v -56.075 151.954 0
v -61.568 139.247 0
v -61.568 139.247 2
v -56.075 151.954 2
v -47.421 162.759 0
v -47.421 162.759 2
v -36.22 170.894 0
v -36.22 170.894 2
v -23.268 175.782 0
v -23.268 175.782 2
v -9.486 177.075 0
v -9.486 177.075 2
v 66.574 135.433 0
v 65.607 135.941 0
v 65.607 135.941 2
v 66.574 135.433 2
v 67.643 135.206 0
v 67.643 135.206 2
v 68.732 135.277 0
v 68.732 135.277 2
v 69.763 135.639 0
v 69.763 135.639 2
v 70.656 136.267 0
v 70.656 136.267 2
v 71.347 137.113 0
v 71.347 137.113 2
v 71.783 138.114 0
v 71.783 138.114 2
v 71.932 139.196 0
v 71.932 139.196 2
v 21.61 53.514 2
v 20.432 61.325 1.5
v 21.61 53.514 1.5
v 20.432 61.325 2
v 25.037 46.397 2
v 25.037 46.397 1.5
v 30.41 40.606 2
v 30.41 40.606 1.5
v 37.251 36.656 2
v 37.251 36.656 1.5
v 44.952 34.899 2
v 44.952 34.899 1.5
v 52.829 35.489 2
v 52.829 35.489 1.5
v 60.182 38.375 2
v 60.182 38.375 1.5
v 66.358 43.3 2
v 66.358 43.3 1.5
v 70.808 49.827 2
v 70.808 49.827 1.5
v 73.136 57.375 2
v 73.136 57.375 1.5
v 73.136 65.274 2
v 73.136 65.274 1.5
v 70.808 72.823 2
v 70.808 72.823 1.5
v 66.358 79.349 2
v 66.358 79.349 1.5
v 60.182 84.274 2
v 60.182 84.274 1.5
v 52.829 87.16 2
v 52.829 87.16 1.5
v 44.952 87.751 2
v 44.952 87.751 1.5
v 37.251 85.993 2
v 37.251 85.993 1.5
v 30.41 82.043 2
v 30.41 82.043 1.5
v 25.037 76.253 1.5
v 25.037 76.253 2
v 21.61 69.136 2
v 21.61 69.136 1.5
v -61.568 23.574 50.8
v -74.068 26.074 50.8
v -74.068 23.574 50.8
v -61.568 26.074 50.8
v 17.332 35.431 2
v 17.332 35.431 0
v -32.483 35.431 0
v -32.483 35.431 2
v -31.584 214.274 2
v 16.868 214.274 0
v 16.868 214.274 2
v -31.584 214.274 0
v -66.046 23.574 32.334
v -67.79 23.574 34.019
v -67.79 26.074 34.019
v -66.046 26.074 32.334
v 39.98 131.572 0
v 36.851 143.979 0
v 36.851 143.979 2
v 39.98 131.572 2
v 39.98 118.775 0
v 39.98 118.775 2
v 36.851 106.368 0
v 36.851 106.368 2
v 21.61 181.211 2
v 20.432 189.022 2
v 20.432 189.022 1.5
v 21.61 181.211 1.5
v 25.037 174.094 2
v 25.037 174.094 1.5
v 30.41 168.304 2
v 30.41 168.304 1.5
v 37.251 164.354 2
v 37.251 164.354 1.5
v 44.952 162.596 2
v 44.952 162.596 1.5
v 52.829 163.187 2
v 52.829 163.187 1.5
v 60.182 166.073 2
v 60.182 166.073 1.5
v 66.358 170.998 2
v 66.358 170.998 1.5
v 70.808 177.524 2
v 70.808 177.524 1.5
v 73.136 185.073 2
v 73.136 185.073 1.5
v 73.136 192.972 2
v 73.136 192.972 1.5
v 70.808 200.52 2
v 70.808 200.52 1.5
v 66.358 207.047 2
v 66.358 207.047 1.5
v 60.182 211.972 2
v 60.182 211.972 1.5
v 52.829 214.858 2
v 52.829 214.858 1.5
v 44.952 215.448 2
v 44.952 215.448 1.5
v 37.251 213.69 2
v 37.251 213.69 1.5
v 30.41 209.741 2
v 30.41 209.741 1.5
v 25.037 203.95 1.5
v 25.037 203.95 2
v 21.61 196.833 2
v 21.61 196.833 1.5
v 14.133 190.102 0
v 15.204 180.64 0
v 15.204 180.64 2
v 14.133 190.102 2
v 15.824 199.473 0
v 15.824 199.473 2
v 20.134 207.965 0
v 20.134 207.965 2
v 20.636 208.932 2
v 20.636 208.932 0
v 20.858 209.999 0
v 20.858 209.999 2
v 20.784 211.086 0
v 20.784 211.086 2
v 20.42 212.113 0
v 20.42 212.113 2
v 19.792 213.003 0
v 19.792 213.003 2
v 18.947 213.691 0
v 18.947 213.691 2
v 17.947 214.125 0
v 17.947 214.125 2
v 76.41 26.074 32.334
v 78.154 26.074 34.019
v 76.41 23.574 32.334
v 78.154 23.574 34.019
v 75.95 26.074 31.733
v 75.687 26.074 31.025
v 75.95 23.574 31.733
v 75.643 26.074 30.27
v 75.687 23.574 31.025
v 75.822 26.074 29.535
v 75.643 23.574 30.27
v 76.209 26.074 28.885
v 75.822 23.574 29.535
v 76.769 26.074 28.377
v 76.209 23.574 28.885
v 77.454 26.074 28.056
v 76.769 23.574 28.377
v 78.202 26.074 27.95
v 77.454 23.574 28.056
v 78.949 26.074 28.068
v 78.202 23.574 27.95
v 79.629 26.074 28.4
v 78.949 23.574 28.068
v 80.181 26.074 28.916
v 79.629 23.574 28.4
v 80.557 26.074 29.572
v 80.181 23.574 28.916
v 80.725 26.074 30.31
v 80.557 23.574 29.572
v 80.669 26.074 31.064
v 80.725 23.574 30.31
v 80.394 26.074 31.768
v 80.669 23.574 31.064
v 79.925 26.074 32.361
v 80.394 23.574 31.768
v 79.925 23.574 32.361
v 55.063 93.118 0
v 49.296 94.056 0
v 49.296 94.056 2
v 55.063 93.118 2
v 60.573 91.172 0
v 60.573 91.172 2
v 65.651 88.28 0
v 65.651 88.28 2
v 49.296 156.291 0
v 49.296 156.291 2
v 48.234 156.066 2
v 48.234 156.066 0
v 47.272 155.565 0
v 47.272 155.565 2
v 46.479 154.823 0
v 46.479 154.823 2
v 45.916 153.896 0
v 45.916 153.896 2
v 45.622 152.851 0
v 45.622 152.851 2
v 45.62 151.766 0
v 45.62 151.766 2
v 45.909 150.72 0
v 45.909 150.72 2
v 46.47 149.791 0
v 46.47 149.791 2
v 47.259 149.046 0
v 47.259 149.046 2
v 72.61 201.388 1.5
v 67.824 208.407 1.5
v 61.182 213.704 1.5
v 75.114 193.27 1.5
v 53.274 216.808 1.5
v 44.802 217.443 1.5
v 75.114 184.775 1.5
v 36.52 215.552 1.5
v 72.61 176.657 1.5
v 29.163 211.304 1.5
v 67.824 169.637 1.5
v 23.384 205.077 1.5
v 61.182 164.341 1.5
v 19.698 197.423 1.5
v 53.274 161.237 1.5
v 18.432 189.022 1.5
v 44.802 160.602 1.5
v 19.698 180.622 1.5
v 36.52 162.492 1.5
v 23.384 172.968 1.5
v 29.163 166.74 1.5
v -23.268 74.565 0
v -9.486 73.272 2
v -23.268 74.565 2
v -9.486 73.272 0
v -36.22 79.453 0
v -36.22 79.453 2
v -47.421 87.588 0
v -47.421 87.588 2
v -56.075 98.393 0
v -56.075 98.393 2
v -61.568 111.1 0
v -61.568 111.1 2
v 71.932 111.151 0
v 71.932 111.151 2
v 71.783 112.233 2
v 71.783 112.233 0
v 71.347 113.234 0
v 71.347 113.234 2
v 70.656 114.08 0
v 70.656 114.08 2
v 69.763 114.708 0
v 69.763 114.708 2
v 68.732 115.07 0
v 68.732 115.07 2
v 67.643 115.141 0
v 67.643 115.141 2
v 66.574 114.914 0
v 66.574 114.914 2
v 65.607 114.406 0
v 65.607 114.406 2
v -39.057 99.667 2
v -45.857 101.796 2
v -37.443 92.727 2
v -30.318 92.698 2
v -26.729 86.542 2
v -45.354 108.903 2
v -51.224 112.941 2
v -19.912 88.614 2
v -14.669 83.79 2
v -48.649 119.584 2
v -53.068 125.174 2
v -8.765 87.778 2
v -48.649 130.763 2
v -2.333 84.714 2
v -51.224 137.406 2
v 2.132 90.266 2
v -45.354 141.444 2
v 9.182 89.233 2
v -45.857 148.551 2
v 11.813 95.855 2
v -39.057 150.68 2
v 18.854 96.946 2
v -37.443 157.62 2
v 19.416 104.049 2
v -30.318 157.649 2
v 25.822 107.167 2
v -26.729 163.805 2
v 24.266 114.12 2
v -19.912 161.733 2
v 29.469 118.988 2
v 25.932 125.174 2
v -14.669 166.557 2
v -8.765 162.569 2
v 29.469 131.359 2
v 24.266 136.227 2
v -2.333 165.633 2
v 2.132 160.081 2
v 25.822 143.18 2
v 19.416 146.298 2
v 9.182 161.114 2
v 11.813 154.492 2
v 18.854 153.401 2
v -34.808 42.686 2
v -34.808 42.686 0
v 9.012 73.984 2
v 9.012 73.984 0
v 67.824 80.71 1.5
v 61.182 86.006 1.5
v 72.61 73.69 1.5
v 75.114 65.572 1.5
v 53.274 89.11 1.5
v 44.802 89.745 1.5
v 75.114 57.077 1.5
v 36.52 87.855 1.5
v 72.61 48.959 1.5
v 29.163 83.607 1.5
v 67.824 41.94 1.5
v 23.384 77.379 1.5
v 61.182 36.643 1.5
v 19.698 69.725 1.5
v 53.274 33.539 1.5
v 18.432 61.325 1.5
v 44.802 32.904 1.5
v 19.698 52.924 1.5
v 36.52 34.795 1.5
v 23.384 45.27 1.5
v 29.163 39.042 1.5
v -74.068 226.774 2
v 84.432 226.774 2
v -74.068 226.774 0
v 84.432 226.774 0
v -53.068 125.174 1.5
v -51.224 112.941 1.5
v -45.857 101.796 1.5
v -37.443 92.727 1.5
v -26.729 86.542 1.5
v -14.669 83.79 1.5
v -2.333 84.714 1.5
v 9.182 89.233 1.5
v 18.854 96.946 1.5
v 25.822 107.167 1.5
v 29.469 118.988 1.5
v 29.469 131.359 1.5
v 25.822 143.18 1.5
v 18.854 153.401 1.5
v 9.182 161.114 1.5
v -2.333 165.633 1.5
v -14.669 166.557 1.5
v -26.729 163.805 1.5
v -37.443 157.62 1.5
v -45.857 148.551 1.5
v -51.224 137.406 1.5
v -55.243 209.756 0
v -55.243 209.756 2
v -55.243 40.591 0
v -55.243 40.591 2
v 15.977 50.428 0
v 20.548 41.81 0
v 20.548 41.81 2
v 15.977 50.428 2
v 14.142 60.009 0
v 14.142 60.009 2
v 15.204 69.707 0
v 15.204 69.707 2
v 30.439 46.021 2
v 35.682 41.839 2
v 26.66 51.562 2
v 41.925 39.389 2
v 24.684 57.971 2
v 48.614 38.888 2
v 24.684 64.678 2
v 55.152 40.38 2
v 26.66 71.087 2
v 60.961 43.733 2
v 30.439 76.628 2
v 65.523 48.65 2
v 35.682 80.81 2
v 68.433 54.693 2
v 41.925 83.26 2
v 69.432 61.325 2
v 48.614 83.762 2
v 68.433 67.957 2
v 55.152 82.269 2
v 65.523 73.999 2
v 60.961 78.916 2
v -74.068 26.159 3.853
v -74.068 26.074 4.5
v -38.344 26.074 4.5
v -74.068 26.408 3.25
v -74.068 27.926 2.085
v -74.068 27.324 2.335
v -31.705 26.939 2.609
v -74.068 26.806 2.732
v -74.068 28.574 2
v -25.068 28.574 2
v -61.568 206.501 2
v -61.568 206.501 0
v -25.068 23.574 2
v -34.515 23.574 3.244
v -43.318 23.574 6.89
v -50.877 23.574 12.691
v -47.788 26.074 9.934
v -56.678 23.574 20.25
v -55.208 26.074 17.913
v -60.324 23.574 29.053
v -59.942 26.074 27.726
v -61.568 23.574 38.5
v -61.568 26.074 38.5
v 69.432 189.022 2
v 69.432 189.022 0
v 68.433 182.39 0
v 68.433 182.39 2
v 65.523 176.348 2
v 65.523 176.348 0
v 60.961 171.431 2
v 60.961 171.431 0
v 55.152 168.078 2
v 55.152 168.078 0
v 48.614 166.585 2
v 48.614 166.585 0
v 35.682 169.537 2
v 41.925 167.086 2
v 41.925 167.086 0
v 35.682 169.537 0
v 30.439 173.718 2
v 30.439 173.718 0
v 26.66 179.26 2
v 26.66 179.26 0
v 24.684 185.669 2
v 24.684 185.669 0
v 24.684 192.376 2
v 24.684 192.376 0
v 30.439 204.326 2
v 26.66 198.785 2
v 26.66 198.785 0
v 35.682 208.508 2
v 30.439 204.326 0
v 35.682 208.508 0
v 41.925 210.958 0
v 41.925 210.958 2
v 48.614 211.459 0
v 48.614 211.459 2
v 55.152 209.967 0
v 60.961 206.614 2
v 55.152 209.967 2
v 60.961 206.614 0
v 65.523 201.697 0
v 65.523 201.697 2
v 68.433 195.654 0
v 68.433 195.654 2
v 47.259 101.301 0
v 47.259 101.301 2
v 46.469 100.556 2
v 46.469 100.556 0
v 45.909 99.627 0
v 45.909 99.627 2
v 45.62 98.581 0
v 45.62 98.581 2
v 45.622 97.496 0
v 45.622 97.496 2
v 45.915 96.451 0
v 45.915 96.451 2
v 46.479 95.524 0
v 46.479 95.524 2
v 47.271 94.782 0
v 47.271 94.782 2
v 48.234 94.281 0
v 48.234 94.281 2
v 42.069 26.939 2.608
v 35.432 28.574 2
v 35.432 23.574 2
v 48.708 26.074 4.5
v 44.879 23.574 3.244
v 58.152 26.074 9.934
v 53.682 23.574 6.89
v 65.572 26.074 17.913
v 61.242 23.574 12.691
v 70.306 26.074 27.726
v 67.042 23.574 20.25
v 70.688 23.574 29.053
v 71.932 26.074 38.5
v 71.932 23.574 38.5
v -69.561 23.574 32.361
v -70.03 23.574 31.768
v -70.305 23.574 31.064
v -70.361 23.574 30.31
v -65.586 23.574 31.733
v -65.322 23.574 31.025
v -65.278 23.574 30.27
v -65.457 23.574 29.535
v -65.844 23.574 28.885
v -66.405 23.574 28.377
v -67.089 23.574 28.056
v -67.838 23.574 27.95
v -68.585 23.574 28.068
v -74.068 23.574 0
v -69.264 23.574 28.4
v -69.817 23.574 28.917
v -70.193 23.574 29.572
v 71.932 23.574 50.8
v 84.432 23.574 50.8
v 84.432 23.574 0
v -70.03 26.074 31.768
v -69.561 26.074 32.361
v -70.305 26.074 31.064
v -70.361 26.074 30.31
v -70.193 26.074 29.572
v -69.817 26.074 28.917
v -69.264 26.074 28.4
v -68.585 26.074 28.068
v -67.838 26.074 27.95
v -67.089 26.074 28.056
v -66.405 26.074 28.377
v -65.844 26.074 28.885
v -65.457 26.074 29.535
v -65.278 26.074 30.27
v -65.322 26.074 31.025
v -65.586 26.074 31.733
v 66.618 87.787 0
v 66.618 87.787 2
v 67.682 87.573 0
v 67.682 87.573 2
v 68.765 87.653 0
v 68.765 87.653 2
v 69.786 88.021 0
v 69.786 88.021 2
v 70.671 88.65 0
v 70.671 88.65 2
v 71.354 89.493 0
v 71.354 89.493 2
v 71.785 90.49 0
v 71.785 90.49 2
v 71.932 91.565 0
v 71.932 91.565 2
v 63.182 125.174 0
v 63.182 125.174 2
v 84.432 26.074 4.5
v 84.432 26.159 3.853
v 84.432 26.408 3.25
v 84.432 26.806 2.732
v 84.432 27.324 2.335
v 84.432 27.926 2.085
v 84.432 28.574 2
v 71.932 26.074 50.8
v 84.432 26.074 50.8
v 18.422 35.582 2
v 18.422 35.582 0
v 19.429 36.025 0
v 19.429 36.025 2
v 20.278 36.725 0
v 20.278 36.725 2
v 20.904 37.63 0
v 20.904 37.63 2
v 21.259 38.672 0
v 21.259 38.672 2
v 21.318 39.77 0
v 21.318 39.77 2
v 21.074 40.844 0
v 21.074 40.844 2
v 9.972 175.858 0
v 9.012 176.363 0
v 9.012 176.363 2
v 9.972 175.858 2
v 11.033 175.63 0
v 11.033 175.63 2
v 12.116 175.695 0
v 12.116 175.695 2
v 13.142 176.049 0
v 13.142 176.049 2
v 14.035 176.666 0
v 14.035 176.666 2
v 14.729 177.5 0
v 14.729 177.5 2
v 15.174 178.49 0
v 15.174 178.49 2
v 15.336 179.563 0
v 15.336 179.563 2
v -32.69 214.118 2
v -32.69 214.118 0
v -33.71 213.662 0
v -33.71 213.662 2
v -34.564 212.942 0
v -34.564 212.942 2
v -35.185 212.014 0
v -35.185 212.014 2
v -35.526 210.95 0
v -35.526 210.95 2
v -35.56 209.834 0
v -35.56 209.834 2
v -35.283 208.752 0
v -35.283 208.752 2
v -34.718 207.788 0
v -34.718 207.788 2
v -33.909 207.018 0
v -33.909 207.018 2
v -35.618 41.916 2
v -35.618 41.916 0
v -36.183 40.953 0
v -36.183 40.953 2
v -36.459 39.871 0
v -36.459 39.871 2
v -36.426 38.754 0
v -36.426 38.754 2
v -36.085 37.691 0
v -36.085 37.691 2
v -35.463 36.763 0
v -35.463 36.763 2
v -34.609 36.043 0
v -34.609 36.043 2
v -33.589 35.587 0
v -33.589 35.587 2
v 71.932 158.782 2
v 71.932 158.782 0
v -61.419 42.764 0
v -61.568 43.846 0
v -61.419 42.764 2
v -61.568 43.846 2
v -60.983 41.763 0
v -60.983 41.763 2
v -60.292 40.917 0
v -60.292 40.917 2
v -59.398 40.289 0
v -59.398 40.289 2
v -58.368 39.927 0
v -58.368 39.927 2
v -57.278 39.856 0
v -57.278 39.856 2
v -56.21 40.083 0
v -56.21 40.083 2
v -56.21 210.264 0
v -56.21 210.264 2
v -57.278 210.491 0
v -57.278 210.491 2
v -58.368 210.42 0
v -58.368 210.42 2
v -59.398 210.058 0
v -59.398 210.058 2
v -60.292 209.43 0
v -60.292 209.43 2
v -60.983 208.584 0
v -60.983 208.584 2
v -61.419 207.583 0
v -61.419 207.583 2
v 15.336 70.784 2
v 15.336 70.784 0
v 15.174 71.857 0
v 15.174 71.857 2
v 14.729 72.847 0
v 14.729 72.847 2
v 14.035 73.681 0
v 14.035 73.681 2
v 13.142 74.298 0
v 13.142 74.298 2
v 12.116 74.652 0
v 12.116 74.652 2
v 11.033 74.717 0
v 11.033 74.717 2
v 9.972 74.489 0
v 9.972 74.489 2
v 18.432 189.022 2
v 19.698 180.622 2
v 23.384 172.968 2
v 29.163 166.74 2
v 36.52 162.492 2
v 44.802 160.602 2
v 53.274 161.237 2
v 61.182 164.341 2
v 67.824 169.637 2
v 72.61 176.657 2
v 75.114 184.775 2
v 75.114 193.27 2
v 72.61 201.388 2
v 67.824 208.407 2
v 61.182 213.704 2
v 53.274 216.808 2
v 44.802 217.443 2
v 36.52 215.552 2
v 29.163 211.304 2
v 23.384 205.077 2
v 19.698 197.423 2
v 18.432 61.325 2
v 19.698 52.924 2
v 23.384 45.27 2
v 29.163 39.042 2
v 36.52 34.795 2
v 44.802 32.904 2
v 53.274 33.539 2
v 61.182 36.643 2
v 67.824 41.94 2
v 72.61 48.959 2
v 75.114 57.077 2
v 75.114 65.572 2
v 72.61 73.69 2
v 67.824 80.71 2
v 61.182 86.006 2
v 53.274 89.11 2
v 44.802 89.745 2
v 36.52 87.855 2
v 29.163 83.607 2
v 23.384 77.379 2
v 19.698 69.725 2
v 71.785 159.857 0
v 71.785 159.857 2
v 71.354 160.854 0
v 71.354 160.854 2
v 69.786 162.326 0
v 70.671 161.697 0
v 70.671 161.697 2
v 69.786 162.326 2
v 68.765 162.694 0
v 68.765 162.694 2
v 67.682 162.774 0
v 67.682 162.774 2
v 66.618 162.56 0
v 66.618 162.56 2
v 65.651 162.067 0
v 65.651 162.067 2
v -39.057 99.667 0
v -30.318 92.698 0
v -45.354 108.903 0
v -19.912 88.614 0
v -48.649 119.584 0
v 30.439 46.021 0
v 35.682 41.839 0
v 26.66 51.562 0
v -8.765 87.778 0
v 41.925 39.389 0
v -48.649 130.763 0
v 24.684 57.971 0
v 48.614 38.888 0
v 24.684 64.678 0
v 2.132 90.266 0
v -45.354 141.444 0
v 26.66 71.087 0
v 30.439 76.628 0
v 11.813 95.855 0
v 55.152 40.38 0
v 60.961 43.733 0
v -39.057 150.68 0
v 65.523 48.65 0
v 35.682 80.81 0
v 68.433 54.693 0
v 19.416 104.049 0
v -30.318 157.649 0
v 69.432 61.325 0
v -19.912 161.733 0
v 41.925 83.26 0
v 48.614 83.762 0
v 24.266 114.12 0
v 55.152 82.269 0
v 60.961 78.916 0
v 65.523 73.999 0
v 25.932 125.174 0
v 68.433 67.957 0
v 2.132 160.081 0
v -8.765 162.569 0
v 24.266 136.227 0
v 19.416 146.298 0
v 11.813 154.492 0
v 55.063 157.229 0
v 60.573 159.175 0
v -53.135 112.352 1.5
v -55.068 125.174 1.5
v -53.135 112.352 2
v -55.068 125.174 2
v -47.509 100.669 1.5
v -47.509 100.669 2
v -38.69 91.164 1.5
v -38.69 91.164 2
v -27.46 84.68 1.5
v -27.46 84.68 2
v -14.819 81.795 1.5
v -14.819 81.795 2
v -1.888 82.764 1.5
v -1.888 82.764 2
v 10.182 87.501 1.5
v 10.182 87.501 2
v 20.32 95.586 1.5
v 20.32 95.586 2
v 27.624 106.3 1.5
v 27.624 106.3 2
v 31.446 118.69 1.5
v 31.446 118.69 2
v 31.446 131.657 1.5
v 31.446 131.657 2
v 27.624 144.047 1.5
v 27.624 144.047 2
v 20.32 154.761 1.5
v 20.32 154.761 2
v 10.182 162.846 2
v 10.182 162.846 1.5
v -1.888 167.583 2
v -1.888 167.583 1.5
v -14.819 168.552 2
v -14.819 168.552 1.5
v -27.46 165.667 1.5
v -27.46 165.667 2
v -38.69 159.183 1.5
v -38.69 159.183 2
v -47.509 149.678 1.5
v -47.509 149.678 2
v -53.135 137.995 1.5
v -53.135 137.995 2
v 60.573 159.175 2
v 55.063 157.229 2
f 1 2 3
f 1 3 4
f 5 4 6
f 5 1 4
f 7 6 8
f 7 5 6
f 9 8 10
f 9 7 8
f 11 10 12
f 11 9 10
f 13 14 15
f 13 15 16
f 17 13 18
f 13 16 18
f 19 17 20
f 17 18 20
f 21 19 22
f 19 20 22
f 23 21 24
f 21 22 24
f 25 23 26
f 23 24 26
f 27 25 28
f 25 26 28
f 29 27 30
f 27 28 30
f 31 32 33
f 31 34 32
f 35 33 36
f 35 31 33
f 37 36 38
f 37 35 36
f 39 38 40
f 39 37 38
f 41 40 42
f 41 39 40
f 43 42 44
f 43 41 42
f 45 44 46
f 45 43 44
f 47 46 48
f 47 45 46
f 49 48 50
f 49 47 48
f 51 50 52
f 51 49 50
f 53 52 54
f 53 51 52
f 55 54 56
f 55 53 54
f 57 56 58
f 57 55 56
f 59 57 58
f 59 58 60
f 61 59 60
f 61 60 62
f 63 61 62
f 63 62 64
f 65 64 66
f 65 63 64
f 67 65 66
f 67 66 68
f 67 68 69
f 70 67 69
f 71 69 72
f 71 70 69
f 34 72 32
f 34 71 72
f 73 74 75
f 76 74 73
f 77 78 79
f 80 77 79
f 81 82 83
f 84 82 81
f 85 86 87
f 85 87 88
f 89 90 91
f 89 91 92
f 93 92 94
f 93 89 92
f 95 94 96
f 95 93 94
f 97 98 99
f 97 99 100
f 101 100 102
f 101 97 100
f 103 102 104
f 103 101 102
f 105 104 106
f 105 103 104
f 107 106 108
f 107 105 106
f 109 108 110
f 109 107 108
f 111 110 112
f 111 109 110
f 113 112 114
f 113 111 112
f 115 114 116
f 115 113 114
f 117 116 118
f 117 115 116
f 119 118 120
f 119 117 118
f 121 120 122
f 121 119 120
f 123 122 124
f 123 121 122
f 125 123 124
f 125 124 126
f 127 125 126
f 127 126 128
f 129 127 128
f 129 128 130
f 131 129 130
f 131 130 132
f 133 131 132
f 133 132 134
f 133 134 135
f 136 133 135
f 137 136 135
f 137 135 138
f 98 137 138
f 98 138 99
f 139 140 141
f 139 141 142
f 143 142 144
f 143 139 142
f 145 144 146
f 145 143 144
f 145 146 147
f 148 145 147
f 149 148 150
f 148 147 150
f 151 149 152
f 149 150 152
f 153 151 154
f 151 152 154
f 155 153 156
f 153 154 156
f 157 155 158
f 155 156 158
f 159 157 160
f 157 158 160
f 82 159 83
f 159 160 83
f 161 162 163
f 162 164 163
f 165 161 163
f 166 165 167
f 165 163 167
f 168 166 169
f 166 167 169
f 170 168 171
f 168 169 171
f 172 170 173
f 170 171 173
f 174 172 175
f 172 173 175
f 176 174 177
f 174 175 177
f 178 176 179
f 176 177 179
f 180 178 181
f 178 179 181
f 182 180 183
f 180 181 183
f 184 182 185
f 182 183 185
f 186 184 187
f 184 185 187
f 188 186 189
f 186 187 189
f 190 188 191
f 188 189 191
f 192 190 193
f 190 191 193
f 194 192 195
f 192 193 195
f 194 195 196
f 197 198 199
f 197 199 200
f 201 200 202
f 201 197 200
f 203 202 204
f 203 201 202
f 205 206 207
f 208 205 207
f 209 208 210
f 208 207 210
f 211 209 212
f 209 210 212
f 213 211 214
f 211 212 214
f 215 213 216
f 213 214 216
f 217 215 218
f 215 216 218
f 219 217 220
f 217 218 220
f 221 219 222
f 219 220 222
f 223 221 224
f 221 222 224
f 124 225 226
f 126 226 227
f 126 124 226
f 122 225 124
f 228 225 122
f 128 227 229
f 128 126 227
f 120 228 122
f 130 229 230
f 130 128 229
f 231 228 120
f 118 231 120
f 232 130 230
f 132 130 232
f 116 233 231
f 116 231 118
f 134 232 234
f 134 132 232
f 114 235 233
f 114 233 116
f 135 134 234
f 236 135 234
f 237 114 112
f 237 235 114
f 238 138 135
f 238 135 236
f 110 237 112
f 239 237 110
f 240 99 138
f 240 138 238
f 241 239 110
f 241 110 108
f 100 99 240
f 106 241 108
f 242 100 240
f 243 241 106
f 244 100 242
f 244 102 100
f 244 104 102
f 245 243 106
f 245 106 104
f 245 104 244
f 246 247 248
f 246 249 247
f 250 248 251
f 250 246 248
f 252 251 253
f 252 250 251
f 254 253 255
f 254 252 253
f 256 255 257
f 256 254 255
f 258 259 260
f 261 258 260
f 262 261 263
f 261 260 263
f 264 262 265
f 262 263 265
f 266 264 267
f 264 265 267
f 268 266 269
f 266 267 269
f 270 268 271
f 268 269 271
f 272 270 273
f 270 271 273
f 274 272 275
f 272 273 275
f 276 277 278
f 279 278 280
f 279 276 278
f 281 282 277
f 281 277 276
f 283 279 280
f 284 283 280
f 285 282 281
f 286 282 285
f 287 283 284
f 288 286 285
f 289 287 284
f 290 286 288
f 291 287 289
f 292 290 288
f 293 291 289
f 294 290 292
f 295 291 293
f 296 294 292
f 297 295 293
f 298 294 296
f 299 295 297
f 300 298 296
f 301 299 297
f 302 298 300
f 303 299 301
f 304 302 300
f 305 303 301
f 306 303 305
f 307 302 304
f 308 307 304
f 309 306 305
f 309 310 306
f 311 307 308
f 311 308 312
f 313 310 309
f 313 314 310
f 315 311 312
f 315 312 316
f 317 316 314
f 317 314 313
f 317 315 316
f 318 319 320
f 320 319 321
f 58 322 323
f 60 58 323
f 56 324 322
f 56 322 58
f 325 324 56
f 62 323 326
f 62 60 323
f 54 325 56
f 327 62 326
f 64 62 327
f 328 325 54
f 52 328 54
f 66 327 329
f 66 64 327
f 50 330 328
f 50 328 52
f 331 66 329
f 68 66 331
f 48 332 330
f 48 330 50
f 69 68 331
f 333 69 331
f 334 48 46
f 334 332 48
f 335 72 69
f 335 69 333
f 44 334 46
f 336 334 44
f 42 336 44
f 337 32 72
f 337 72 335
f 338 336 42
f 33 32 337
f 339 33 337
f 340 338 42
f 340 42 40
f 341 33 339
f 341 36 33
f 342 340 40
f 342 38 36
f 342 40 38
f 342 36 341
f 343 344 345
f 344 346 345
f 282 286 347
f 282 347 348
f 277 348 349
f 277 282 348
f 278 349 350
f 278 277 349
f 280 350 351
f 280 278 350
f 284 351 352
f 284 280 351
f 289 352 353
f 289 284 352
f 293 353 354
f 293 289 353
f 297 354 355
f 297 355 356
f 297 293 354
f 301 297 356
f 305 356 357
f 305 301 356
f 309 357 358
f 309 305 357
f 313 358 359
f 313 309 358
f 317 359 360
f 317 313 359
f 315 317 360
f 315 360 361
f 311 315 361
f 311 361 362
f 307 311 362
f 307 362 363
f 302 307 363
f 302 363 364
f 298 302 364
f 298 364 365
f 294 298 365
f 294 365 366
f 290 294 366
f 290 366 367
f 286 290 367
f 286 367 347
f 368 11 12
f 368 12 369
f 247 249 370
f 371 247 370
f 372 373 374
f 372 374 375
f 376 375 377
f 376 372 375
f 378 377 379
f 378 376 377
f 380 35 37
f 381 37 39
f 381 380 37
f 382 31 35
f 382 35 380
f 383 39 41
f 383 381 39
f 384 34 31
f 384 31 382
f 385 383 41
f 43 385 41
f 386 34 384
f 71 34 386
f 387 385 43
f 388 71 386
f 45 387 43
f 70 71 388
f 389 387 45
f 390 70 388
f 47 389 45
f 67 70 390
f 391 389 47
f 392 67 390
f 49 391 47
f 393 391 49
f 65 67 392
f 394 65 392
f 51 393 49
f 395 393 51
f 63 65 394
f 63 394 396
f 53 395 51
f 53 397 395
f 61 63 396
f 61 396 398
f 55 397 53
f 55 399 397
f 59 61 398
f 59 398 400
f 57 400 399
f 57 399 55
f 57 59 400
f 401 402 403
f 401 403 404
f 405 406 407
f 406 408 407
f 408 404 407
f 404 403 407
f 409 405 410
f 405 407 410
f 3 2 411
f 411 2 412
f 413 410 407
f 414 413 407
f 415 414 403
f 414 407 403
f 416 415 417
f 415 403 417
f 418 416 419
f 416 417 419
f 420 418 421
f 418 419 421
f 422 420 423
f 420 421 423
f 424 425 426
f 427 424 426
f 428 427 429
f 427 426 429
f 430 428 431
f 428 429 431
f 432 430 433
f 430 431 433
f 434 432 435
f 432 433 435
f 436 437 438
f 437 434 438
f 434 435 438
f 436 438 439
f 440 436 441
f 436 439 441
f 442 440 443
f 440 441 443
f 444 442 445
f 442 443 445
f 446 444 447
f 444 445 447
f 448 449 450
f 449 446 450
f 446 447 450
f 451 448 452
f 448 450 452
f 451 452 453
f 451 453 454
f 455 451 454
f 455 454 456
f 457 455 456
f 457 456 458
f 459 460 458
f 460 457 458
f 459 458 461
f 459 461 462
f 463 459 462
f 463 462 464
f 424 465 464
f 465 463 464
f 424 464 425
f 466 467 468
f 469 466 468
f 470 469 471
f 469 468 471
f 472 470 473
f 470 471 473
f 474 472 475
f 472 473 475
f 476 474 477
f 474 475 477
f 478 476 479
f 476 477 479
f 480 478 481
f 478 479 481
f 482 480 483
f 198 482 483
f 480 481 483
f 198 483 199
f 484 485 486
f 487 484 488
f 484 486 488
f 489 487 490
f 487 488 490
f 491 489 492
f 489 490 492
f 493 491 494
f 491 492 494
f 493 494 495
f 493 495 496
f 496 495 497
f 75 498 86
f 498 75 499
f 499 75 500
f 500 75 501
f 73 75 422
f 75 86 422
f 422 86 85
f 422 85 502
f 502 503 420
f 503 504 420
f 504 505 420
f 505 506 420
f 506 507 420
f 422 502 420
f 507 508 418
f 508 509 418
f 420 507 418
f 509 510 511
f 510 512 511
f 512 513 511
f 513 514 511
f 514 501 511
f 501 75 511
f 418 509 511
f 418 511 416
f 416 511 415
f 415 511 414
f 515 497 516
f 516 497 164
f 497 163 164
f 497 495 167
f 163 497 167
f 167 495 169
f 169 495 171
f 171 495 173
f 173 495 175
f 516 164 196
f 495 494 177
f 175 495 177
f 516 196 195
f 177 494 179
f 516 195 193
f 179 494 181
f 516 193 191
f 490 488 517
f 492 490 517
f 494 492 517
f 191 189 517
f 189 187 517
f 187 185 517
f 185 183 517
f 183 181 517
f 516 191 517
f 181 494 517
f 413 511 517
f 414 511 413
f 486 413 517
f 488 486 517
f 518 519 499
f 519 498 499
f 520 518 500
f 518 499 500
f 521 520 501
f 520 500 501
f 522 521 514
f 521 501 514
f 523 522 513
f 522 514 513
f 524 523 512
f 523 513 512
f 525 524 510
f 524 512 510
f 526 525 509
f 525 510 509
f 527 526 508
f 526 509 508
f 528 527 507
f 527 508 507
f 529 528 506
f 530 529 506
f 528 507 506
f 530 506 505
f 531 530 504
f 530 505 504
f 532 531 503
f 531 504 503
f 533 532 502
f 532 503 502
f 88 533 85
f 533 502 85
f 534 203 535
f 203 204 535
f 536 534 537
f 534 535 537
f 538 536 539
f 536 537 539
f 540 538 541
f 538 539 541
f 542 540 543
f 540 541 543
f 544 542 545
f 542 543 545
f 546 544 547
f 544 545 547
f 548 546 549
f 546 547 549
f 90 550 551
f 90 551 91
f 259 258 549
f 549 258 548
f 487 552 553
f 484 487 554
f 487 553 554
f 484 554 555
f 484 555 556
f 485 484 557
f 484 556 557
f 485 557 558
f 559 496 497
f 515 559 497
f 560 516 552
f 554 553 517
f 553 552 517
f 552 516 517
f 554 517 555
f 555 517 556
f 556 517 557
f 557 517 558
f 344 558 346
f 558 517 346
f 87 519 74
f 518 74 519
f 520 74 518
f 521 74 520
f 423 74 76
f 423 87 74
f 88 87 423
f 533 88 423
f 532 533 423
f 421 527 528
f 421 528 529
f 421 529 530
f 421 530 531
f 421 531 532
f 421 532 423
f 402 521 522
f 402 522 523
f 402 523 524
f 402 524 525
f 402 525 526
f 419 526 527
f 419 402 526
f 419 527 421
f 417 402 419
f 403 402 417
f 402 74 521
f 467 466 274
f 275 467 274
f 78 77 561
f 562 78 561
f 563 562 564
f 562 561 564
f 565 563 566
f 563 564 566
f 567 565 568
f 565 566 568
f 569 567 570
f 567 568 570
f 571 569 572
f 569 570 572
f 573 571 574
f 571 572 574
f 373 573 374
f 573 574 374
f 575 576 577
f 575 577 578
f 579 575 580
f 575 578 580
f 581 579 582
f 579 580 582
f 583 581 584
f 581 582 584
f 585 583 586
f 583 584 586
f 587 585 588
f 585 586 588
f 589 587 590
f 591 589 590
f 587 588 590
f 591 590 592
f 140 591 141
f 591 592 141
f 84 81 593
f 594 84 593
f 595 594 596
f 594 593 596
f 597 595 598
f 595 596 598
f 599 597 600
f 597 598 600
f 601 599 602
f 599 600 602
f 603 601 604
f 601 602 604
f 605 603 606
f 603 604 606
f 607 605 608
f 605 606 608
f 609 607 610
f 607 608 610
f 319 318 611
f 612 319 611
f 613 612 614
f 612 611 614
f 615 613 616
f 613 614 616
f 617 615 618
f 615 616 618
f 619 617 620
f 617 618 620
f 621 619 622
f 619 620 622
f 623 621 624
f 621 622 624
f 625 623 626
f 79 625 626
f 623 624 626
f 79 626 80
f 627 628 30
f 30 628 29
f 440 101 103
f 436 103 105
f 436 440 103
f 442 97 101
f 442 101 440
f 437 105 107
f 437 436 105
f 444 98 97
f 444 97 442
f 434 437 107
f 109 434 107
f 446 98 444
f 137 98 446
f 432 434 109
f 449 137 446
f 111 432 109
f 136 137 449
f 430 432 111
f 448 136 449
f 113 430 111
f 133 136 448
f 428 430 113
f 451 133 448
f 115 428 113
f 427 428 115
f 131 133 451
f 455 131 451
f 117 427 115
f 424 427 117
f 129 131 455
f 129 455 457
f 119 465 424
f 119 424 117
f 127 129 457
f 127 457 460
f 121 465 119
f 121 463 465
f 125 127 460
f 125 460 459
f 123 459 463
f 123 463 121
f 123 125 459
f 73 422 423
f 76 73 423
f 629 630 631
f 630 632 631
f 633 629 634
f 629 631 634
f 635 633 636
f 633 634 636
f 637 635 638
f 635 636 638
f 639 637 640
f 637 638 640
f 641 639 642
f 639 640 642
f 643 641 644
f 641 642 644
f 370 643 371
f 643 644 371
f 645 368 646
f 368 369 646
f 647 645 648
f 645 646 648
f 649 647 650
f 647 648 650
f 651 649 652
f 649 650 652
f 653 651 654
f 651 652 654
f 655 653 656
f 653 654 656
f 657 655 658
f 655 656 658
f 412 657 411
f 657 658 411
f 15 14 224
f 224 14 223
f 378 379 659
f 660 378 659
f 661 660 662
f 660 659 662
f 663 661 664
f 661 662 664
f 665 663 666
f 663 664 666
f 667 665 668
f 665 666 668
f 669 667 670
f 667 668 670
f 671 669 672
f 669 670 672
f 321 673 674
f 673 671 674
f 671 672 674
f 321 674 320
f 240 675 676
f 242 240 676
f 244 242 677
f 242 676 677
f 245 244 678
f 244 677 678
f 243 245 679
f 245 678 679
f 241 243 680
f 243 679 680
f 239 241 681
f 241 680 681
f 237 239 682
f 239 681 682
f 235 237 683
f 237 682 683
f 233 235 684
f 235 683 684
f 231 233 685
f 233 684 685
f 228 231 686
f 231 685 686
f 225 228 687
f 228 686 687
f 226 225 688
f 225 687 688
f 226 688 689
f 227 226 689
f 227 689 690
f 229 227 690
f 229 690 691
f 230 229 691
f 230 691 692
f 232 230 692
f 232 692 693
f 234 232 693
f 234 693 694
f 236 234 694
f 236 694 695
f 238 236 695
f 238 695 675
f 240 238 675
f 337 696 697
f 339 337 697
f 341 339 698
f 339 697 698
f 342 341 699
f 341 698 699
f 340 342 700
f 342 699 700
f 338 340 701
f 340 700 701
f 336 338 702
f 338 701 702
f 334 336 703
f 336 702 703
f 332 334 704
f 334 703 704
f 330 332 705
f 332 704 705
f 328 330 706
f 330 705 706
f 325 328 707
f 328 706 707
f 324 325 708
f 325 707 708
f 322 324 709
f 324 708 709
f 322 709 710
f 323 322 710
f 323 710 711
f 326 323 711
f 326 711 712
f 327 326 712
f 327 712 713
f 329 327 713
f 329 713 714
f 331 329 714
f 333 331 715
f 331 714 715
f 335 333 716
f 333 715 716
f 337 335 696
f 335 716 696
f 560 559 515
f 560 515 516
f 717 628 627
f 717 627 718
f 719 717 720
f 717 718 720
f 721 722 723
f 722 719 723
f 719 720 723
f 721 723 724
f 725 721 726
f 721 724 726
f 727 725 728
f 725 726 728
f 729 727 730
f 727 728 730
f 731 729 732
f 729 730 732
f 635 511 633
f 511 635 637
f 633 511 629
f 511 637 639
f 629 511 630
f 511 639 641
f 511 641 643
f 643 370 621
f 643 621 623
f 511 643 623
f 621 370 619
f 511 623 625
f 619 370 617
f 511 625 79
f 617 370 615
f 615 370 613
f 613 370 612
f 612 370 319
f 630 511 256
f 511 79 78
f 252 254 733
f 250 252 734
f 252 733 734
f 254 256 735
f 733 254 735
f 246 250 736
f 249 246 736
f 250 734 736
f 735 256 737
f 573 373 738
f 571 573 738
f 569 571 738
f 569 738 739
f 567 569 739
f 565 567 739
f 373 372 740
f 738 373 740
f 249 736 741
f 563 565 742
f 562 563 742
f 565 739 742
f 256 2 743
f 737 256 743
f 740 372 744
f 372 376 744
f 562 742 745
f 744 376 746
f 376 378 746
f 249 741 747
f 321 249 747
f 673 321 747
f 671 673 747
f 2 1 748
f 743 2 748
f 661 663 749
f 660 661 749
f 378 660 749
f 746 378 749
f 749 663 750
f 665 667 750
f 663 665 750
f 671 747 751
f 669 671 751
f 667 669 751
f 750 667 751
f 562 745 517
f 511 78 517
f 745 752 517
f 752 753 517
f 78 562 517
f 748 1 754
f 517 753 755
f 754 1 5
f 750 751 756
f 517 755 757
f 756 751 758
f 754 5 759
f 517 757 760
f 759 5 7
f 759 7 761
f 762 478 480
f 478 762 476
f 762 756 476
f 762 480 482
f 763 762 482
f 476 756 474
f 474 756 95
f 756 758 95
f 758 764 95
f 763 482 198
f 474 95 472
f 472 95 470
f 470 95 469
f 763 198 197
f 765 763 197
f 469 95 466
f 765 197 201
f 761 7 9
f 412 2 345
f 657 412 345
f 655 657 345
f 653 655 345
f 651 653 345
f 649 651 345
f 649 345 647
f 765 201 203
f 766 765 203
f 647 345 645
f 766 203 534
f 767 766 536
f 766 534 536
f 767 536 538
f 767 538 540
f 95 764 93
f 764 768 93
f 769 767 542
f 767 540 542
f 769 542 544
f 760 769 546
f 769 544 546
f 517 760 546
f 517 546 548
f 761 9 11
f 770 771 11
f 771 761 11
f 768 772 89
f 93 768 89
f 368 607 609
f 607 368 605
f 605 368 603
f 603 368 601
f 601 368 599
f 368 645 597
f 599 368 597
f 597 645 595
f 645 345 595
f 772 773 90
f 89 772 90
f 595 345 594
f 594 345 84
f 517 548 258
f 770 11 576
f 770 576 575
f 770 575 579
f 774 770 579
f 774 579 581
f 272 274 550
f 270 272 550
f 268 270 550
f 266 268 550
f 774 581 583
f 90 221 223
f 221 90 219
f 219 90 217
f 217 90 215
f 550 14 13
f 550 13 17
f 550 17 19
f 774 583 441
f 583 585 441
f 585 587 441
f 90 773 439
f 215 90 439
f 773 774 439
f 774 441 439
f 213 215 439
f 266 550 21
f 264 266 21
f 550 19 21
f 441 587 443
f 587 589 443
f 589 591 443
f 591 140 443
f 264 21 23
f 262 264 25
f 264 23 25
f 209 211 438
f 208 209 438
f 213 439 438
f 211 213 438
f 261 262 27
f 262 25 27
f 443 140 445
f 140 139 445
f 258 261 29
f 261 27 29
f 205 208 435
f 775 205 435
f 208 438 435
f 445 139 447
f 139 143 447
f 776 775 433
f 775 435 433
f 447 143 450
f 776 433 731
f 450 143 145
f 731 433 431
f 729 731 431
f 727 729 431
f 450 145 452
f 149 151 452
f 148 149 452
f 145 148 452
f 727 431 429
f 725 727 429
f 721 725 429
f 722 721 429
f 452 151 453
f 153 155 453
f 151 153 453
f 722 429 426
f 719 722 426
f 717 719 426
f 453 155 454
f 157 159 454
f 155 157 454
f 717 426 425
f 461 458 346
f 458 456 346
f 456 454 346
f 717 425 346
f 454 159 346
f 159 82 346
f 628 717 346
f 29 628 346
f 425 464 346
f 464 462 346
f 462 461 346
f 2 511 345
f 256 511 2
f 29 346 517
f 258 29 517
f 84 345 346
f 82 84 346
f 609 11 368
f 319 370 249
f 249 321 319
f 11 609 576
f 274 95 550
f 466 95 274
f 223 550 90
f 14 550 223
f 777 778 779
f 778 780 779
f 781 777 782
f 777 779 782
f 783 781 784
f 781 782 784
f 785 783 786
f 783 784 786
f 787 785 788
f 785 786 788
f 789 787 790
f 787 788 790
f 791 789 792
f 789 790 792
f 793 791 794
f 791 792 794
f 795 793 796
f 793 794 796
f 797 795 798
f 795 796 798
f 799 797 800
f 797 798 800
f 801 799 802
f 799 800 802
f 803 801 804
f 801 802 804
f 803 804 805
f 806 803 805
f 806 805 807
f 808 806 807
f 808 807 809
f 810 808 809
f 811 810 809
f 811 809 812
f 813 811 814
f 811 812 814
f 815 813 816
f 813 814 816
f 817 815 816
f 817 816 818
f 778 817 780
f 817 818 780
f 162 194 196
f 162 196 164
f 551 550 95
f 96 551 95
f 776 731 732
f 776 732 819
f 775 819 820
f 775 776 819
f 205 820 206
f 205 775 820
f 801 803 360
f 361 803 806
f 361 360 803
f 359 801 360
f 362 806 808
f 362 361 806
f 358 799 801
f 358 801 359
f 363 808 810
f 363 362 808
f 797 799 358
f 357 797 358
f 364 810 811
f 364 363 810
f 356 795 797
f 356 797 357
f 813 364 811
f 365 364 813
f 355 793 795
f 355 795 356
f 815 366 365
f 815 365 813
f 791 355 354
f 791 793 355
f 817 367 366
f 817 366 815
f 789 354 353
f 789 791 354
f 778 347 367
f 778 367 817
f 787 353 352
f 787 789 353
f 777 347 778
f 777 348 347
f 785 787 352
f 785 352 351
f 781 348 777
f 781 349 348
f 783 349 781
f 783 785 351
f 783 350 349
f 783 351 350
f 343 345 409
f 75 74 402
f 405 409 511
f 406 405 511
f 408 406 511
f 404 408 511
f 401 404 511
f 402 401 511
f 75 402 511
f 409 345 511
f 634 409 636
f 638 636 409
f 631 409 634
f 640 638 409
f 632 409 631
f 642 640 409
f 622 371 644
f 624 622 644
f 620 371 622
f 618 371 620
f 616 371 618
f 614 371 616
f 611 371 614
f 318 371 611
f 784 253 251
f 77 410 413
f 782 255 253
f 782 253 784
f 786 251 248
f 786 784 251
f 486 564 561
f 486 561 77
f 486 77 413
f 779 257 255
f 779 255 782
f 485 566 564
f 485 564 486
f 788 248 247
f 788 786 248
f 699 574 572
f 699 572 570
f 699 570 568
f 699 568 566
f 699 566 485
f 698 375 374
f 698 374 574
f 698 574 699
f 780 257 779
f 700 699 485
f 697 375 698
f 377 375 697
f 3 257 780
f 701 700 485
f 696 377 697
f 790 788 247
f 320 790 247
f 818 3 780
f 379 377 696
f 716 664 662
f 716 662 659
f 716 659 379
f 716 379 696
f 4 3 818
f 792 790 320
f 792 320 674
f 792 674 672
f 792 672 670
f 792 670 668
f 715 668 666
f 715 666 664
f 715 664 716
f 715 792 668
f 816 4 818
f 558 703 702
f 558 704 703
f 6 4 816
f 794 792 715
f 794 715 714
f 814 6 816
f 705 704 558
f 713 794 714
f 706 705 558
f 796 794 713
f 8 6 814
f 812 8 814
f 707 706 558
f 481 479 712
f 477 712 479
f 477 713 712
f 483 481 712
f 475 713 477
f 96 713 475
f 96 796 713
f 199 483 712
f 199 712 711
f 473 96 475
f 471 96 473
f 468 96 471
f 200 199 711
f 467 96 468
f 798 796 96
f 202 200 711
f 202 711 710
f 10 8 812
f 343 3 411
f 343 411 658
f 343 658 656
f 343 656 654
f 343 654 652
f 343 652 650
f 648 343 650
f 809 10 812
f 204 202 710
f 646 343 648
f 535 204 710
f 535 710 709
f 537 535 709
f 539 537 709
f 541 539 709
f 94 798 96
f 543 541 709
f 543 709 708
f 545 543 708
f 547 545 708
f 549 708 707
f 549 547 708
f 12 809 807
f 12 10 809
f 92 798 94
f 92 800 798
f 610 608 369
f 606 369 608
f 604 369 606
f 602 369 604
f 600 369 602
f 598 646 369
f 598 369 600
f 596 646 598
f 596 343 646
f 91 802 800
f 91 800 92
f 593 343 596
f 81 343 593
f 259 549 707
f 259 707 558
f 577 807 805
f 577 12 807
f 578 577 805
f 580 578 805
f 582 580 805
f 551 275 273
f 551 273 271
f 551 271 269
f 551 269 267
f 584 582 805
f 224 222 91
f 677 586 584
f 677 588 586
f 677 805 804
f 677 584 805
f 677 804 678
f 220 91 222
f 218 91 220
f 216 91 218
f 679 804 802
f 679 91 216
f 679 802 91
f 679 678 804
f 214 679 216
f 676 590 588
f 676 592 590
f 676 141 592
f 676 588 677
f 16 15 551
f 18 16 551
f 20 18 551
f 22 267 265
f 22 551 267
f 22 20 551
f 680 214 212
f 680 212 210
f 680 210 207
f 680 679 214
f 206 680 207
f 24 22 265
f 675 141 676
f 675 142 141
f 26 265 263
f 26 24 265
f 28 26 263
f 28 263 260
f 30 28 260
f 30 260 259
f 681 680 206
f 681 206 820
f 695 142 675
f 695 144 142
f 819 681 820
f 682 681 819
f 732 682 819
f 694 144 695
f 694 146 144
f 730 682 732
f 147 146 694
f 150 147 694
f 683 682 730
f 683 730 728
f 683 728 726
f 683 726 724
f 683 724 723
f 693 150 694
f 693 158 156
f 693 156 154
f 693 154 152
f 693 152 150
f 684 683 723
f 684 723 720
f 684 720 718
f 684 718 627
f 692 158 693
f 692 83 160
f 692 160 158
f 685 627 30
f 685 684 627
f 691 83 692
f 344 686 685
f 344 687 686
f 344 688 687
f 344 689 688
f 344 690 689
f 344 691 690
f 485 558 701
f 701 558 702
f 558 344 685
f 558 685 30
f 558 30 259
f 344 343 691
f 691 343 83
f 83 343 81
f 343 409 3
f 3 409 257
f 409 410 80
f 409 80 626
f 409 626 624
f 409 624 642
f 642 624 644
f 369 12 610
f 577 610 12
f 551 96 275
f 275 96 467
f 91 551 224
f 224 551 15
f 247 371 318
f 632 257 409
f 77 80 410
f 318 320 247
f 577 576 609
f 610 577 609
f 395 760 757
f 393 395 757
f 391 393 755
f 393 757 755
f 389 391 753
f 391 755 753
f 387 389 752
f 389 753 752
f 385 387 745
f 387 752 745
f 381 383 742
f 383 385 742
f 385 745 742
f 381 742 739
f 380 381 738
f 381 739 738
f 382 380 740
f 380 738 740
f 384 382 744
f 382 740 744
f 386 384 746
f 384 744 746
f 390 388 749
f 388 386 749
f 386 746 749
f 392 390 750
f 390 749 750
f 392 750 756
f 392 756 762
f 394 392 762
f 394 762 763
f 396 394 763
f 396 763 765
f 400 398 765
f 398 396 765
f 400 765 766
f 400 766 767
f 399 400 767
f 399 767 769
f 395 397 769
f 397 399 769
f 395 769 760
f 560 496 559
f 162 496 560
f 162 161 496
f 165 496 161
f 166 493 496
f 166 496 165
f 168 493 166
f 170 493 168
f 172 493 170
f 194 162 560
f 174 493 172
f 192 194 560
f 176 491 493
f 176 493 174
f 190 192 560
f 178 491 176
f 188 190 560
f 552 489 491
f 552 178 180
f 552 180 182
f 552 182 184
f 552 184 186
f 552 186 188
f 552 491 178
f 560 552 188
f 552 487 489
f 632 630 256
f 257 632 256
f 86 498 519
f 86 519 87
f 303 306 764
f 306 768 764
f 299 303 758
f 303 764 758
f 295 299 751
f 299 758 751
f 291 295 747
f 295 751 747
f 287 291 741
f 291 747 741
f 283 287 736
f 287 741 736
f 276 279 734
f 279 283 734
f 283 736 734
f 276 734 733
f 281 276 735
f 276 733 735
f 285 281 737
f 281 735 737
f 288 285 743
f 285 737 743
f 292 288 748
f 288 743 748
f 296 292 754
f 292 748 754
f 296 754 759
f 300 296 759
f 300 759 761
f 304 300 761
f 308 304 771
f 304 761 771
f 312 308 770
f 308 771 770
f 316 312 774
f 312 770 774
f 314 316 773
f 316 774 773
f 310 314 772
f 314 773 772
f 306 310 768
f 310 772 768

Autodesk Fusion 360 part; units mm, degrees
sketch "Sketch1" plane through (0, 0, 0) normal (0, 0, 1) x (1, 0, 0)
  line L0 (-74.0678, 23.5735) -> (-61.5678, 23.5735)
  line L1 (-61.5678, 23.5735) -> (-61.5678, 226.7735)
  line L2 (-61.5678, 226.7735) -> (-74.0678, 226.7735)
  line L3 (-74.0678, 226.7735) -> (-74.0678, 23.5735)
  line L4 (71.9322, 23.5735) -> (84.4322, 23.5735)
  line L5 (84.4322, 23.5735) -> (84.4322, 226.7735)
  line L6 (84.4322, 226.7735) -> (71.9322, 226.7735)
  line L7 (71.9322, 226.7735) -> (71.9322, 23.5735)
  line L8 (-32, 23.5735) -> (47, 23.5735) construction
  circle A0 centre (-67.8178, 5.0413) radius 2.55 construction
  circle A1 centre (78.1822, 4.9635) radius 2.55 construction
  line L9 (-74.0678, 26.0735) -> (-61.5678, 26.0735)
  line L10 (-61.5678, 26.0735) -> (-61.5678, 23.5735)
  line L11 (-61.5678, 23.5735) -> (-74.0678, 23.5735)
  line L12 (-74.0678, 23.5735) -> (-74.0678, 26.0735)
  line L13 (71.9322, 26.0735) -> (84.4322, 26.0735)
  line L14 (84.4322, 26.0735) -> (84.4322, 23.5735)
  line L15 (84.4322, 23.5735) -> (71.9322, 23.5735)
  line L16 (71.9322, 23.5735) -> (71.9322, 26.0735)
  line L17 (55.3253, 131.4235) -> (71.9322, 131.4235) construction
  line L18 (71.9322, 131.4235) -> (71.9322, 118.9235) construction
  line L19 (71.9322, 118.9235) -> (55.3253, 118.9235) construction
  line L20 (55.3253, 118.9235) -> (55.3253, 131.4235) construction
  line L21 (-61.5678, 23.5735) -> (71.9322, 118.9235)
  line L22 (71.9322, 131.4235) -> (-61.5678, 36.0735)
  line L23 (71.9322, 131.4235) -> (-61.5678, 226.7735)
  line L24 (71.9322, 118.9235) -> (-61.5678, 214.2735)
  line L25 (-61.5678, 23.5735) -> (71.9322, 23.5735)
  line L26 (67.9766, 35.4311) -> (-44.9659, 35.4311)
  circle A2 centre (46.9322, 61.3246) radius 22.5
  circle A3 centre (46.9322, 61.3246) radius 32.817
  circle A4 centre (-11.5678, 125.1735) radius 37.5
  circle A5 centre (-11.5678, 125.1735) radius 51.943
  line L27 (-61.5678, 226.7735) -> (71.9322, 226.7735)
  line L28 (71.9322, 214.2735) -> (-44.0665, 214.2735)
  line L29 (84.4322, 125.1735) -> (-74.0678, 125.1735) construction
  circle A6 centre (46.9322, 189.0223) radius 32.817
  circle A7 centre (46.9322, 189.0223) radius 22.5
  point P0 (-67.8178, 23.5735)
  point P1 (78.1822, 23.5735)
  point P2 (71.9322, 125.1735)
  point P3 (71.9322, 125.1735)
  dimension "d1" = 12.5
  dimension "d2" = 12.5
  dimension "d3" = 5.1
  dimension "d4" = 5.1
  dimension "d7" = 146
  dimension "d8" = 203.2
  dimension "d9" = 2.5
  dimension "d10" = 2.5
  dimension "d16" = 12.5
  dimension "d17" = 12.5
  dimension "d18" = 12.5
  dimension "d19" = 12.5
  dimension "d20" = 10.317
  dimension "d21" = 14.443
  dimension "d24" = 12.5
  dimension "d27" = 45
  dimension "d28" = 25
  dimension "d29" = 50
  dimension "d30" = 75
extrude "Extrude1" add sketch "Sketch1" along normal blind 50.8 contours L0 L1 L3 L9 L10 L11 L12 | L4 L5 L7 L13 L14 L15 L16 makes body 1 at (-69.9011, 26.0735, 16.9333) makes body 2 at (76.0989, 23.5735, 16.9333)
ref_plane "WorkPlane1" through (5.1822, 24.8235, 25.4) normal (1, 0, 0) x (0, 1, 0)
sketch "Sketch2" plane through (0, 23.5735, 0) normal (0, -1, 0) x (1, 0, 0)
  line L0 (-74.0678, 0) -> (-61.5678, 0)
  line L1 (-61.5678, 0) -> (-61.5678, 50.8)
  line L2 (-61.5678, 50.8) -> (-74.0678, 50.8)
  line L3 (-74.0678, 50.8) -> (-74.0678, 0)
  circle A0 centre (-67.8178, 30.5) radius 2.55
  line L4 (-74.0678, 0) -> (-61.5678, 0)
  line L5 (5.1822, 55.88) -> (5.1822, -5.08)
  circle A1 centre (78.1822, 30.5) radius 2.55
  line L6 (-69.5607, 32.3613) -> (-67.79, 34.0194)
  line L7 (-67.79, 34.0194) -> (-66.0457, 32.3336)
  line L8 (79.9252, 32.3613) -> (78.1545, 34.0194)
  line L9 (78.1545, 34.0194) -> (76.4101, 32.3336)
  point P0 (-67.8178, 50.8)
  dimension "d13" = 5.1
  dimension "d14" = 30.5
extrude "Extrude2" cut sketch "Sketch2" against normal through all contours A0 | A0 L6 L7 | A1 | A1 L8 L9 bodies 1 2
extrude "Extrude3" add sketch "Sketch1" along normal blind 2 contours L1 L10 L21 L22 L24 A3 A5 | L7 L16 L21 L25 L26 A3 | L1 L2 L3 L9 A5 | L21 A3 | L7 L21 L26 A3 | L26 A3 | L5 L6 L7 L13 A3 A6 | L1 L22 L23 L24 A5 A6 | L7 L23 L27 L28 A6 | L1 A5 | L1 L22 L24 A5 | L22 A5 | L7 A3 | L7 L22 L24 | L24 A5 | L7 L23 L28 A6 | L23 A6 | L28 A6 | L7 L28 A6 | L7 A6 bodies 1 2
fillet "Fillet2" radius 4 14 edges at (-61.5678, 36.0735, 1) (23.6038, 84.4057, 1) (26.7709, 35.4311, 1) (32.6668, 90.8788, 1) (71.9322, 118.9235, 1) (71.9322, 131.4235, 1) (32.6668, 159.4681, 1) (71.9322, 167.7631, 1) (-44.0665, 214.2735, 1) (23.6038, 165.9412, 1) (25.972, 214.2735, 1) (-61.5678, 214.2735, 1) (71.9322, 82.5838, 1) (-44.9659, 35.4311, 1) on bodies 1
sketch "Sketch3" plane through (0, 0, 2) normal (0, 0, 1) x (-1, 0, 0)
  line L0 (61.5678, -23.5735) -> (-71.9322, -23.5735)
  line L1 (-84.4322, -26.0735) -> (-84.4322, -226.7735)
  line L2 (-84.4322, -226.7735) -> (74.0678, -226.7735)
  line L3 (74.0678, -226.7735) -> (74.0678, -26.0735)
  line L4 (-36.8514, -143.9793) -> (-63.1816, -125.1735)
  line L5 (-63.1816, -125.1735) -> (-36.8514, -106.3676)
  arc A0 (-36.8514, -106.3676) -> (-36.8514, -143.9793) centre (11.5678, -125.1735) ccw
  line L6 (-47.2589, -101.301) -> (-65.6074, -114.4061)
  arc A1 (-71.9322, -111.151) -> (-65.6074, -114.4061) centre (-67.9322, -111.151) ccw
  line L7 (-71.9322, -111.151) -> (-71.9322, -91.5651)
  arc A2 (-65.6507, -88.2796) -> (-71.9322, -91.5651) centre (-67.9322, -91.5651) ccw
  arc A3 (-65.6507, -88.2796) -> (-49.2957, -94.0564) centre (-46.9322, -61.3246) ccw
  arc A4 (-47.2589, -101.301) -> (-49.2957, -94.0564) centre (-49.5838, -98.046) ccw
  circle A5 centre (11.5678, -125.1735) radius 37.5
  circle A6 centre (-46.9322, -189.0223) radius 22.5
  line L8 (55.2429, -209.7561) -> (9.4856, -177.0747)
  arc A7 (9.4856, -177.0747) -> (61.5678, -139.2473) centre (11.5678, -125.1735) ccw
  line L9 (61.5678, -139.2473) -> (61.5678, -206.501)
  arc A8 (55.2429, -209.7561) -> (61.5678, -206.501) centre (57.5678, -206.501) ccw
  circle A9 centre (-46.9322, -61.3246) radius 22.5
  arc A10 (-49.2957, -156.2905) -> (-65.6507, -162.0673) centre (-46.9322, -189.0223) ccw
  arc A11 (-71.9322, -158.7818) -> (-65.6507, -162.0673) centre (-67.9322, -158.7818) ccw
  line L10 (-71.9322, -158.7818) -> (-71.9322, -139.1959)
  arc A12 (-65.6074, -135.9409) -> (-71.9322, -139.1959) centre (-67.9322, -139.1959) ccw
  line L11 (-65.6074, -135.9409) -> (-47.2589, -149.0459)
  arc A13 (-49.2957, -156.2905) -> (-47.2589, -149.0459) centre (-49.5838, -152.3009) ccw
  line L12 (34.8081, -42.6861) -> (-9.0117, -73.9836)
  arc A14 (-15.2038, -69.7068) -> (-9.0117, -73.9836) centre (-11.3365, -70.7285) ccw
  arc A15 (-15.2038, -69.7068) -> (-20.5481, -41.8097) centre (-46.9322, -61.3246) ccw
  arc A16 (-17.3322, -35.4311) -> (-20.5481, -41.8097) centre (-17.3322, -39.4311) ccw
  line L13 (-17.3322, -35.4311) -> (32.4832, -35.4311)
  arc A17 (34.8081, -42.6861) -> (32.4832, -35.4311) centre (32.4832, -39.4311) ccw
  line L14 (61.5678, -43.8459) -> (61.5678, -111.0996)
  arc A18 (61.5678, -111.0996) -> (9.4856, -73.2722) centre (11.5678, -125.1735) ccw
  line L15 (9.4856, -73.2722) -> (55.2429, -40.5909)
  arc A19 (61.5678, -43.8459) -> (55.2429, -40.5909) centre (57.5678, -43.8459) ccw
  line L16 (31.5838, -214.2735) -> (-16.8677, -214.2735)
  arc A20 (-20.1341, -207.9646) -> (-16.8677, -214.2735) centre (-16.8677, -210.2735) ccw
  arc A21 (-20.1341, -207.9646) -> (-15.2038, -180.6401) centre (-46.9322, -189.0223) ccw
  arc A22 (-9.0117, -176.3633) -> (-15.2038, -180.6401) centre (-11.3365, -179.6184) ccw
  line L17 (-9.0117, -176.3633) -> (33.9087, -207.0184)
  arc A23 (31.5838, -214.2735) -> (33.9087, -207.0184) centre (31.5838, -210.2735) ccw
  circle A24 centre (-46.9322, -61.3246) radius 26.5
  circle A25 centre (-46.9322, -61.3246) radius 28.5
  circle A26 centre (11.5678, -125.1735) radius 41.5
  circle A27 centre (11.5678, -125.1735) radius 43.5
  circle A28 centre (-46.9322, -189.0223) radius 26.5
  circle A29 centre (-46.9322, -189.0223) radius 28.5
  line L18 (74.0678, -26.0735) -> (61.5678, -26.0735)
  line L19 (61.5678, -26.0735) -> (61.5678, -23.5735)
  line L20 (-71.9322, -23.5735) -> (-71.9322, -26.0735)
  line L21 (-71.9322, -26.0735) -> (-84.4322, -26.0735)
  dimension "d31" = 4
  dimension "d32" = 6
  dimension "d33" = 4
  dimension "d34" = 6
  dimension "d35" = 4
  dimension "d36" = 6
extrude "Extrude4" cut sketch "Sketch3" against normal blind 0.5 contours A25 | A27 | A29 bodies 1
fillet "Fillet3" radius 36.5 2 edges at (-61.5678, 24.8235, 2) (71.9322, 24.8235, 2) on bodies 1
fillet "Fillet4" radius 2.5 2 edges at (59.9322, 26.0735, 2) (-49.5678, 26.0735, 2) on bodies 1
